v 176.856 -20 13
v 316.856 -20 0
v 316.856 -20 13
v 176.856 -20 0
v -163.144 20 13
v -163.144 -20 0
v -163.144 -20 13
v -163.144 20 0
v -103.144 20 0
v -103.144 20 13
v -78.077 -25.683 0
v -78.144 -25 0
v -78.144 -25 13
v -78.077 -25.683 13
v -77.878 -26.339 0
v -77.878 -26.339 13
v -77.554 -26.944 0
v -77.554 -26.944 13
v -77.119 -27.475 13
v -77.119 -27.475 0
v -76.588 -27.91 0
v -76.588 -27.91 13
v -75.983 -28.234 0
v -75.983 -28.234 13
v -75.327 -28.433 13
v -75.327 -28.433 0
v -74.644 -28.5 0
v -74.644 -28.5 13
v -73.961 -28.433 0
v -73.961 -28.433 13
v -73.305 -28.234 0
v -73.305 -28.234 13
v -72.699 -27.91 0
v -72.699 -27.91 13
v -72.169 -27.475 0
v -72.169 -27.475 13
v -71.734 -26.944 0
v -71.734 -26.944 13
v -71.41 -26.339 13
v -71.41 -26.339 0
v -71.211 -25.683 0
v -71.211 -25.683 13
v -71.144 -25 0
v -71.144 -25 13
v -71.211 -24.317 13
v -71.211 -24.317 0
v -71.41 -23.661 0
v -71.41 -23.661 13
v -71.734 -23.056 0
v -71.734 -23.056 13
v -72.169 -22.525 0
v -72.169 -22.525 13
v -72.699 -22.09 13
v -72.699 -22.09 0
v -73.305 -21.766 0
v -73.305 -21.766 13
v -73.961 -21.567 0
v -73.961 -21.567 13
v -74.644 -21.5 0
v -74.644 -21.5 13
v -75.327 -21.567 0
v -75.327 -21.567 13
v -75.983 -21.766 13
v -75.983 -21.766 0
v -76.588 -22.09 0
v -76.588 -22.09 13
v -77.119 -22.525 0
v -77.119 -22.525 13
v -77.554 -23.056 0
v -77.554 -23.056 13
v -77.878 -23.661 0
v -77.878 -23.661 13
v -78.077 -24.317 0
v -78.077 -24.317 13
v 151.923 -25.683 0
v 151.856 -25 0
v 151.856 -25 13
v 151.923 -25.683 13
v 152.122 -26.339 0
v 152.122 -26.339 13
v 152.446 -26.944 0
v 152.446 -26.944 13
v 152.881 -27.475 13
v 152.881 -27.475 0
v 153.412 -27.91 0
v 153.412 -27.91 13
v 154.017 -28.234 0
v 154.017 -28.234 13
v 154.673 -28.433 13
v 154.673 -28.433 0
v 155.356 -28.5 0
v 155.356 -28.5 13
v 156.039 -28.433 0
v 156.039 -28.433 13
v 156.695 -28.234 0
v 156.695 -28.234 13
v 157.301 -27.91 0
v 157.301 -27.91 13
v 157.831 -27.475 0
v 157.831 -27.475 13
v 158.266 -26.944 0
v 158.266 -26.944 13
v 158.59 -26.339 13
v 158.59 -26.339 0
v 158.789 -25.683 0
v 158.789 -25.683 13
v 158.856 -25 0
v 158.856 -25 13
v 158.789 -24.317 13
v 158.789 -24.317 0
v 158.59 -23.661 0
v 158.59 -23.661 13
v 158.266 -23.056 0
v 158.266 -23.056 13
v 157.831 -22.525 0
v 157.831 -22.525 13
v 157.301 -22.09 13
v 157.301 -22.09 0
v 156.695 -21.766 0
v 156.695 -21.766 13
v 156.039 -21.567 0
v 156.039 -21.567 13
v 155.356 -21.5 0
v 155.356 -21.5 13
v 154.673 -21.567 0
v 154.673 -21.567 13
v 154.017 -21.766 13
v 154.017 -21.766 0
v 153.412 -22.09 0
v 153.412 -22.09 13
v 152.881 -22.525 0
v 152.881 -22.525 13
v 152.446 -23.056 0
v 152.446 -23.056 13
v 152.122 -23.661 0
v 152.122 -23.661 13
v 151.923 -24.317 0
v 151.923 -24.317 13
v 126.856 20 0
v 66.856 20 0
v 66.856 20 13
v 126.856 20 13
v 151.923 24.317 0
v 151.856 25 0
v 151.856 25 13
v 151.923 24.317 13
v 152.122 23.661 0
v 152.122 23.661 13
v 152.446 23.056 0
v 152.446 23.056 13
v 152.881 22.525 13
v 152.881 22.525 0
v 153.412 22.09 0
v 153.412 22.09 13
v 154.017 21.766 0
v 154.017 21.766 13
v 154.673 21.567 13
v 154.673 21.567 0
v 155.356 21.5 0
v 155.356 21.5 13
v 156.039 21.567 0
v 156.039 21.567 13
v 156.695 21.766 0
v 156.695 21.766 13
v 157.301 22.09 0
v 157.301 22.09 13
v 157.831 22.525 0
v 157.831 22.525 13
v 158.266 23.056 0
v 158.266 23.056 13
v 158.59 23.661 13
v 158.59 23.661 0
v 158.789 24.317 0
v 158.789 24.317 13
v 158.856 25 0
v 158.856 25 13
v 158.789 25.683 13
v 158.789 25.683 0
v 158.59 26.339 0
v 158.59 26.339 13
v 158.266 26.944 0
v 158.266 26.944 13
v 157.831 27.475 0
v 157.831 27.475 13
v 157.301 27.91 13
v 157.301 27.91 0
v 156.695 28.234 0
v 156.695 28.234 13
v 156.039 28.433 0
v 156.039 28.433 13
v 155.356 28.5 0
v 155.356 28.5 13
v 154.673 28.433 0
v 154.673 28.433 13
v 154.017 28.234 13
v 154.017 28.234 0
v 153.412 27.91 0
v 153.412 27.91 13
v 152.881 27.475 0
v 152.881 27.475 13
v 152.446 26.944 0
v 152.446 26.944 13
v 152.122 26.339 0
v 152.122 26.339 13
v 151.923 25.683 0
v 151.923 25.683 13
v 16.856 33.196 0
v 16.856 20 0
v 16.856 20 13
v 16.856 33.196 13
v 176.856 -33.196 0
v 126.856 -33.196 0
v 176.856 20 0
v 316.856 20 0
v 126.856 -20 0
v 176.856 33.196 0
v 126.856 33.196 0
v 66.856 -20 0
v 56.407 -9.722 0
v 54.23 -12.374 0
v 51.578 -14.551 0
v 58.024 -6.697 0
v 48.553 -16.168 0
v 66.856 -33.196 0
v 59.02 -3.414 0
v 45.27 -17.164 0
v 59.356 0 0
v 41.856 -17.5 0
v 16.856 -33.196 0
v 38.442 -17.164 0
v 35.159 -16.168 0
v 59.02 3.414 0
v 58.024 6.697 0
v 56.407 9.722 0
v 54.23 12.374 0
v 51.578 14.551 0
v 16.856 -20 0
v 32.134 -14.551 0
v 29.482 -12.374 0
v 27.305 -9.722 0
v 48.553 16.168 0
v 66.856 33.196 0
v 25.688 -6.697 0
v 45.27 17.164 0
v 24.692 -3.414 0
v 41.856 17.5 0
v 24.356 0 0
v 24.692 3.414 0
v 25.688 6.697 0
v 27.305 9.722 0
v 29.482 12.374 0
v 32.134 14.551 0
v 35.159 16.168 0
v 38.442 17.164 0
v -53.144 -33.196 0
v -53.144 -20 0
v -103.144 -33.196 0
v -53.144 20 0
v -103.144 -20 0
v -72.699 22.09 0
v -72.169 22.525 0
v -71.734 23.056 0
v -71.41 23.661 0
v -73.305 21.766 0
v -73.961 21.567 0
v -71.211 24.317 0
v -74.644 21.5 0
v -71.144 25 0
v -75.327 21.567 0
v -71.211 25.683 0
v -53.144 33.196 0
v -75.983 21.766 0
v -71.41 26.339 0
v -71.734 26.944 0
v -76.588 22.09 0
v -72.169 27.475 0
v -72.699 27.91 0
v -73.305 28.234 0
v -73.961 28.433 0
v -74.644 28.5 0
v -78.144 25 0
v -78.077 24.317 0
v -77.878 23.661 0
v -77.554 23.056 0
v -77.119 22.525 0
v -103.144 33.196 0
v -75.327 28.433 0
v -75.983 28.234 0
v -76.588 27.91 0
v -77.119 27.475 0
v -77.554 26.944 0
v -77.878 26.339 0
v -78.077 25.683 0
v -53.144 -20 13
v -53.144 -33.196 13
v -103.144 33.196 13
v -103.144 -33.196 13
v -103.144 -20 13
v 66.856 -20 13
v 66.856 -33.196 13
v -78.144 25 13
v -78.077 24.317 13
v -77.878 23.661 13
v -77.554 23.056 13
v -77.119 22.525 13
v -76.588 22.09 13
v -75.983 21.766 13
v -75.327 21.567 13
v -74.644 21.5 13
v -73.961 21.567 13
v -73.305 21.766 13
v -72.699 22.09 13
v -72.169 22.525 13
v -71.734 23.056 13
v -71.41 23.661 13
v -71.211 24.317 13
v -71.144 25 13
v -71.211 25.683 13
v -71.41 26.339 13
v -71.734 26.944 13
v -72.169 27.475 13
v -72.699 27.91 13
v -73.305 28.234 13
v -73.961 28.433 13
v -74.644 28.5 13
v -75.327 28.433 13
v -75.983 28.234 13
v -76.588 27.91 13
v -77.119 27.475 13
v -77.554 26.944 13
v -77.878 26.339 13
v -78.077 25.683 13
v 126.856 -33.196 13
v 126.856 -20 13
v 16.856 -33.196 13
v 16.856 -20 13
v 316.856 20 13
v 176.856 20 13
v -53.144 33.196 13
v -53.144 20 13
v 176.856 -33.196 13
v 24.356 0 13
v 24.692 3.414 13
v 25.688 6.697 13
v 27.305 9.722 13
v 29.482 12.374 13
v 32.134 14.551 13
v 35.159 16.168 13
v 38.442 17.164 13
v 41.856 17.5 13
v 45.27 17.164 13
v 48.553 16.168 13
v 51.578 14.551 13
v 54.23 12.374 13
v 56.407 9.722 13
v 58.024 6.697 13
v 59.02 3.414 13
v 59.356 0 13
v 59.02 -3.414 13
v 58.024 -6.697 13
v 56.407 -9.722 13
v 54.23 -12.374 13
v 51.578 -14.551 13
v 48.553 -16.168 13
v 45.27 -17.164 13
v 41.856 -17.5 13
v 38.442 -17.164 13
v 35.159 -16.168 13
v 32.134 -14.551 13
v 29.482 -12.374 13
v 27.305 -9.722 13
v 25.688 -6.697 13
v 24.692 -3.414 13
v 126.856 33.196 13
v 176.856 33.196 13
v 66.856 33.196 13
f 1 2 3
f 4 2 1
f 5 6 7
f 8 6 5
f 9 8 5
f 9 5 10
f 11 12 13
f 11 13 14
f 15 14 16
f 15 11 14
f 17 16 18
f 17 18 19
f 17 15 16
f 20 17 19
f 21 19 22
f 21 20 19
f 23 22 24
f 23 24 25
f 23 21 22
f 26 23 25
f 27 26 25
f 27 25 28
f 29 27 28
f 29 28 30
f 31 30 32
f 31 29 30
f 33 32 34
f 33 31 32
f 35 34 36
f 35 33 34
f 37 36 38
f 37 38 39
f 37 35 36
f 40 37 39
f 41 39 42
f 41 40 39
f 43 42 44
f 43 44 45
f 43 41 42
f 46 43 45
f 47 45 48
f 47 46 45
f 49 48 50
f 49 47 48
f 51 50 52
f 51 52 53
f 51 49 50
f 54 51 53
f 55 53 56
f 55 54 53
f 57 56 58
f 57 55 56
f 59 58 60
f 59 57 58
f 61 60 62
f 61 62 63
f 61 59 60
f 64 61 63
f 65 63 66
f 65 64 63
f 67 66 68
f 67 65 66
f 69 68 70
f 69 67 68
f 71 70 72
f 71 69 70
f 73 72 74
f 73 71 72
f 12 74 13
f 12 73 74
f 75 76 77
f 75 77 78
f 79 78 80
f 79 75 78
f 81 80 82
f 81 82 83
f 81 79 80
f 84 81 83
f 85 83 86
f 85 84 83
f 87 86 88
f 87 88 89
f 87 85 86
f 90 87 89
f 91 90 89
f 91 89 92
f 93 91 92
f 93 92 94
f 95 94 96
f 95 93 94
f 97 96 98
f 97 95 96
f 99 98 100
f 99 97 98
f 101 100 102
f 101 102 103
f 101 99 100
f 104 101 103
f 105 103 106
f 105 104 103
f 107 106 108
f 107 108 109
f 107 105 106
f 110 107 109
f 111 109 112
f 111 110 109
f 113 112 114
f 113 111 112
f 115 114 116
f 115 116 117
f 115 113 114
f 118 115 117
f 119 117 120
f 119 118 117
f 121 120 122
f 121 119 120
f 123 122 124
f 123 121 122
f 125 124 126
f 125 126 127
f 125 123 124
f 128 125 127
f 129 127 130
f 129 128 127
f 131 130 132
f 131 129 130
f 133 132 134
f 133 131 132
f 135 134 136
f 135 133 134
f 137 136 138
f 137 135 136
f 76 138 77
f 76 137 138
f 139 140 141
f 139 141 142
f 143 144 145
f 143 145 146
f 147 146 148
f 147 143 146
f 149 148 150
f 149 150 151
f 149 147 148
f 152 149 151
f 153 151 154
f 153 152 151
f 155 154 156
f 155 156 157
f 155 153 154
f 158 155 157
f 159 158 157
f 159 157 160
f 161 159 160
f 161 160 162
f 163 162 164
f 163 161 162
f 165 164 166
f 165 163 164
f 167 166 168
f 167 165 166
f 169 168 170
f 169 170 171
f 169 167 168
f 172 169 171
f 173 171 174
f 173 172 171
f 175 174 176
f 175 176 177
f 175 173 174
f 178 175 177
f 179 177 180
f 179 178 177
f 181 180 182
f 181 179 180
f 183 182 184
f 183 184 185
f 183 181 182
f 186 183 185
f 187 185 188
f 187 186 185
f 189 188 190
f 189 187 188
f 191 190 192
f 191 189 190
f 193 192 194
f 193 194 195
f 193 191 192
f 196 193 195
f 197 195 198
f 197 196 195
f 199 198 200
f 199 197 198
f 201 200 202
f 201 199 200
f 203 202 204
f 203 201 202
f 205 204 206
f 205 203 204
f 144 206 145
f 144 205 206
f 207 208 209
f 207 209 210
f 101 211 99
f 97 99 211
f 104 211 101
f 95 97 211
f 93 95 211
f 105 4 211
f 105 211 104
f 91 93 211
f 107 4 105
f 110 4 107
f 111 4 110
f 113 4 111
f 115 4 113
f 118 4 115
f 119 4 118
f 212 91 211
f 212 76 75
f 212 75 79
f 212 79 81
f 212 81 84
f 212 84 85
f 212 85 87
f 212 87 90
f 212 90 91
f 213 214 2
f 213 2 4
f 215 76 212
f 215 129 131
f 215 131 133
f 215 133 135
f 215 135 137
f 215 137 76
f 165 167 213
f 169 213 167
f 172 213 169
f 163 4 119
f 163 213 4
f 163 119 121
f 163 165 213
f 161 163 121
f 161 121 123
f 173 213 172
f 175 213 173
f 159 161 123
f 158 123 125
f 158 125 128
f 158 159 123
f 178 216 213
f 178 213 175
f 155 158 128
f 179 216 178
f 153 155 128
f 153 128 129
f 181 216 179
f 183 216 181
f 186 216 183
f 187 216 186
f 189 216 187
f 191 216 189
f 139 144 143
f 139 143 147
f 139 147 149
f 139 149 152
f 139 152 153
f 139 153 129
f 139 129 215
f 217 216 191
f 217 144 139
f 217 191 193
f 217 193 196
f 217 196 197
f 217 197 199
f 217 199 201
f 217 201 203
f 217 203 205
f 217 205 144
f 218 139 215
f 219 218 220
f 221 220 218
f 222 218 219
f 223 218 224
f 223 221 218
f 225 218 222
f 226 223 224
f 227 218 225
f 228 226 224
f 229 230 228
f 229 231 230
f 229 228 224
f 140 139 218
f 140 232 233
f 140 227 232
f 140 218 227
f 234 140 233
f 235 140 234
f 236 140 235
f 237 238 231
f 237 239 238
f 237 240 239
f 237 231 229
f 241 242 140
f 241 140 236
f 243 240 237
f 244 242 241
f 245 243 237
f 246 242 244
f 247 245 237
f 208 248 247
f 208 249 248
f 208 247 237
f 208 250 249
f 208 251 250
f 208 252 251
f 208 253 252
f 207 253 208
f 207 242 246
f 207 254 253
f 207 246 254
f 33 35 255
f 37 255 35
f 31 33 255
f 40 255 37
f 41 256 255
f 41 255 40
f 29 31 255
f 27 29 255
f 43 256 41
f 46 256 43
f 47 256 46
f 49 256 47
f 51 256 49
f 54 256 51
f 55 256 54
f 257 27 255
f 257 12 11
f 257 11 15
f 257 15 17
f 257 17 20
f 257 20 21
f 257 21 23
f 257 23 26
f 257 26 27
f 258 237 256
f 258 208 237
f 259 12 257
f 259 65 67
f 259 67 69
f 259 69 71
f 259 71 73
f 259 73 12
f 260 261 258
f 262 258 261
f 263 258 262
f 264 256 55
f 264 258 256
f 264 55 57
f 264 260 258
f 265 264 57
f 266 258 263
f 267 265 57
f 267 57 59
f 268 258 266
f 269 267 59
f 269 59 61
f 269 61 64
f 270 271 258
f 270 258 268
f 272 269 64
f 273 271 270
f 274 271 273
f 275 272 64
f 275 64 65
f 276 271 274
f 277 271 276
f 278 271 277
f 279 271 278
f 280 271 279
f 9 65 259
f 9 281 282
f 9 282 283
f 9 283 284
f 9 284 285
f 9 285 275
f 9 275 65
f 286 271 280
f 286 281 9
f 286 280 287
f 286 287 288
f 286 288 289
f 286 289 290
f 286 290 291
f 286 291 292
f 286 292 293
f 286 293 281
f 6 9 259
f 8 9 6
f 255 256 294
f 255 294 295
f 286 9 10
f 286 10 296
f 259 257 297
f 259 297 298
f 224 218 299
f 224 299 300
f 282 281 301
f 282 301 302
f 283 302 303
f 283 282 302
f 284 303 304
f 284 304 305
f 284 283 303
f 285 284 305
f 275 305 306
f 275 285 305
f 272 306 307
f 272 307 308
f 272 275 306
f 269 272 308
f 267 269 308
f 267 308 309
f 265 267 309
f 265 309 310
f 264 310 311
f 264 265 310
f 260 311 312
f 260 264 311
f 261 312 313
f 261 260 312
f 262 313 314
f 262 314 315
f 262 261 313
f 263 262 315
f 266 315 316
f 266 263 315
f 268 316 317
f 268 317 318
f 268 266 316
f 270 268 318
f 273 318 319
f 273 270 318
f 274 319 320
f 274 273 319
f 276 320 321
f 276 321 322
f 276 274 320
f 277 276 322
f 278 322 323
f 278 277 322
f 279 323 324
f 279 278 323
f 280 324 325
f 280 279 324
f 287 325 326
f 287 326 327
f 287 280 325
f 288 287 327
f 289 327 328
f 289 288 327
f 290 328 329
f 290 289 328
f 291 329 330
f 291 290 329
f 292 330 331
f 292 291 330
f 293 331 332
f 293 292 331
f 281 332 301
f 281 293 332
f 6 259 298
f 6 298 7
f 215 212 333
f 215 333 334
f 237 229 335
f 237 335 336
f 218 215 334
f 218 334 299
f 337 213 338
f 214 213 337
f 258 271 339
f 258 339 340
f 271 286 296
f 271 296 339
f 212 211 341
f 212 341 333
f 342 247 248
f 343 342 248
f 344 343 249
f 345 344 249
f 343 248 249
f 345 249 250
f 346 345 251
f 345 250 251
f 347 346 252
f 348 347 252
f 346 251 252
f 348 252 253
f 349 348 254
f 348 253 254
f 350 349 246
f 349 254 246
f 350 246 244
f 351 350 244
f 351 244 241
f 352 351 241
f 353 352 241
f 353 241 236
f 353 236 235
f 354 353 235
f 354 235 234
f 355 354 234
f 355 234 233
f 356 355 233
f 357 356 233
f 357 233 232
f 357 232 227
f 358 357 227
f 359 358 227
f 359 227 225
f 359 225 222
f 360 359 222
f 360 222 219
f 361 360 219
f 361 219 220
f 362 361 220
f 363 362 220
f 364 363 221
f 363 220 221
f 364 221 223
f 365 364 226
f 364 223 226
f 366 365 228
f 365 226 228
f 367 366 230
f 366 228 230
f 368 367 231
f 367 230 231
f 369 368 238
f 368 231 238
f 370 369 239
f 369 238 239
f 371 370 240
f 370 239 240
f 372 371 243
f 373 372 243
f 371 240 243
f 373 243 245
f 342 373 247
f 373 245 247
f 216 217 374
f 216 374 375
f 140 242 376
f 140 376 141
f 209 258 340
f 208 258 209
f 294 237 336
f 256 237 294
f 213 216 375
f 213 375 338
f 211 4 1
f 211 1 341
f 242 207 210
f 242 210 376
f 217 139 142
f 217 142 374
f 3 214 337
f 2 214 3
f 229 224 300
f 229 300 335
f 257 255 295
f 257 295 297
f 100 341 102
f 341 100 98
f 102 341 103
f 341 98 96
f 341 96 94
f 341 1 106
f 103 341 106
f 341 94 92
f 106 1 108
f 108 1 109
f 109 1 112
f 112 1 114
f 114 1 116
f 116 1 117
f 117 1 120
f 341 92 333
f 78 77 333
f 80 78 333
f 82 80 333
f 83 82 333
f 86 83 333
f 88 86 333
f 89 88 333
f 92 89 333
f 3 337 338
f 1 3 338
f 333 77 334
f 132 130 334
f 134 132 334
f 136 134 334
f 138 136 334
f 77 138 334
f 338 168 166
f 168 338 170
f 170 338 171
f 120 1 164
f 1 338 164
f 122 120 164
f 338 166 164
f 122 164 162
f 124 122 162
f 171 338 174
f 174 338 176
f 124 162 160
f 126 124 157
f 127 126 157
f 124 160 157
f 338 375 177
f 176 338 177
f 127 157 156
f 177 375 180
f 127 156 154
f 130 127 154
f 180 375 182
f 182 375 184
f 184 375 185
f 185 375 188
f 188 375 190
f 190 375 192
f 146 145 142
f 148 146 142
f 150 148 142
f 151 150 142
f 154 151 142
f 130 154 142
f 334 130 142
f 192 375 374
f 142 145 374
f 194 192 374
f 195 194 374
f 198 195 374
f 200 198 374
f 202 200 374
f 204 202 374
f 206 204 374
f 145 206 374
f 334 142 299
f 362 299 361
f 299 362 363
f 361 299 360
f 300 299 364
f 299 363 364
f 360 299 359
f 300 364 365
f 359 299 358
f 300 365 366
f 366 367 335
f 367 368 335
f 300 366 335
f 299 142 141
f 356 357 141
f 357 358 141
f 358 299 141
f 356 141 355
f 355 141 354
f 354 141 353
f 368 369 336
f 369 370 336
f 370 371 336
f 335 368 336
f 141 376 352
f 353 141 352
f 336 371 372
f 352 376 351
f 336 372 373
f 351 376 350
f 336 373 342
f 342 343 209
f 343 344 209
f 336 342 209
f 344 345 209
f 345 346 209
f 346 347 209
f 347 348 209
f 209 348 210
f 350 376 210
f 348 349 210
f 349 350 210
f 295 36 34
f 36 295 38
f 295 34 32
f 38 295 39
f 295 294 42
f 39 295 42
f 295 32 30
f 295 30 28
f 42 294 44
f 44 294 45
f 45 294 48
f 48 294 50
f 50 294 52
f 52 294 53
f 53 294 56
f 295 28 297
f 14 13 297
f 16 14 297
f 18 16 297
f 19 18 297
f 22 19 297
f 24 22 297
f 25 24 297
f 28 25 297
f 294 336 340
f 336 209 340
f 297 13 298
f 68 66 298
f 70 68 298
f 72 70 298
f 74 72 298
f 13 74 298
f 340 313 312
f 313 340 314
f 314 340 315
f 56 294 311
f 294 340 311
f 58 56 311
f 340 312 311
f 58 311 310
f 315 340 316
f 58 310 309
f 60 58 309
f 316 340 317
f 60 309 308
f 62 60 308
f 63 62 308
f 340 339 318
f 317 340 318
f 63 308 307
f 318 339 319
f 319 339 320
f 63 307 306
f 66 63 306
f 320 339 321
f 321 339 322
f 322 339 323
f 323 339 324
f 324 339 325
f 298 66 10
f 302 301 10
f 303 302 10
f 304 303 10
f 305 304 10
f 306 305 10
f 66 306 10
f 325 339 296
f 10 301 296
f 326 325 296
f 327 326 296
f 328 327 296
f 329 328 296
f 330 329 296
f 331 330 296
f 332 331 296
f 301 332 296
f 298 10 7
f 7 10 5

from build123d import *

# Parameters (mm, degrees)
SKETCH1_R              = 3.5
BOSS_EXTRUDE1_DEPTH    = 13
F_25_0MM_DOWEL_HOLE1_D = 35


with BuildPart() as part:
    # Sketch1 → Boss-Extrude1 (new body)
    with BuildSketch(Plane.XY):
        Polygon((-103.143983002, 33.195876289), (-53.143983002, 33.195876289), (-53.143983002, 20), (16.856016998, 20), (16.856016998, 33.195876289), (66.856016998, 33.195876289), (66.856016998, 20), (126.856016998, 20), (126.856016998, 33.195876289), (176.856016998, 33.195876289), (176.856016998, 20), (316.856016998, 20), (316.856016998, -20), (176.856016998, -20), (176.856016998, -33.195876289), (126.856016998, -33.195876289), (126.856016998, -20), (66.856016998, -20), (66.856016998, -33.195876289), (16.856016998, -33.195876289), (16.856016998, -20), (-53.143983002, -20), (-53.143983002, -33.195876289), (-103.143983002, -33.195876289), (-103.143983002, -20), (-163.143983002, -20), (-163.143983002, 20), (-103.143983002, 20), align=None)
        with Locations(Location((-74.643983002, 25, 0), (0, 0, 180))):
            Circle(SKETCH1_R, mode=Mode.SUBTRACT)
        with Locations(Location((155.356016998, 25, 0), (0, 0, 180))):
            Circle(SKETCH1_R, mode=Mode.SUBTRACT)
        with Locations(Location((155.356016998, -25, 0), (0, 0, 180))):
            Circle(SKETCH1_R, mode=Mode.SUBTRACT)
        with Locations(Location((-74.643983002, -25, 0), (0, 0, 180))):
            Circle(SKETCH1_R, mode=Mode.SUBTRACT)
    extrude(amount=BOSS_EXTRUDE1_DEPTH)

    # Ø25.0mm Dowel Hole1 (through all)
    with Locations(Plane(origin=(41.856016998, 0, 13), x_dir=(1, 0, 0), z_dir=(0, 0, 1))):
        with Locations((0, 0)):
            Hole(F_25_0MM_DOWEL_HOLE1_D / 2)


solid = part.part
